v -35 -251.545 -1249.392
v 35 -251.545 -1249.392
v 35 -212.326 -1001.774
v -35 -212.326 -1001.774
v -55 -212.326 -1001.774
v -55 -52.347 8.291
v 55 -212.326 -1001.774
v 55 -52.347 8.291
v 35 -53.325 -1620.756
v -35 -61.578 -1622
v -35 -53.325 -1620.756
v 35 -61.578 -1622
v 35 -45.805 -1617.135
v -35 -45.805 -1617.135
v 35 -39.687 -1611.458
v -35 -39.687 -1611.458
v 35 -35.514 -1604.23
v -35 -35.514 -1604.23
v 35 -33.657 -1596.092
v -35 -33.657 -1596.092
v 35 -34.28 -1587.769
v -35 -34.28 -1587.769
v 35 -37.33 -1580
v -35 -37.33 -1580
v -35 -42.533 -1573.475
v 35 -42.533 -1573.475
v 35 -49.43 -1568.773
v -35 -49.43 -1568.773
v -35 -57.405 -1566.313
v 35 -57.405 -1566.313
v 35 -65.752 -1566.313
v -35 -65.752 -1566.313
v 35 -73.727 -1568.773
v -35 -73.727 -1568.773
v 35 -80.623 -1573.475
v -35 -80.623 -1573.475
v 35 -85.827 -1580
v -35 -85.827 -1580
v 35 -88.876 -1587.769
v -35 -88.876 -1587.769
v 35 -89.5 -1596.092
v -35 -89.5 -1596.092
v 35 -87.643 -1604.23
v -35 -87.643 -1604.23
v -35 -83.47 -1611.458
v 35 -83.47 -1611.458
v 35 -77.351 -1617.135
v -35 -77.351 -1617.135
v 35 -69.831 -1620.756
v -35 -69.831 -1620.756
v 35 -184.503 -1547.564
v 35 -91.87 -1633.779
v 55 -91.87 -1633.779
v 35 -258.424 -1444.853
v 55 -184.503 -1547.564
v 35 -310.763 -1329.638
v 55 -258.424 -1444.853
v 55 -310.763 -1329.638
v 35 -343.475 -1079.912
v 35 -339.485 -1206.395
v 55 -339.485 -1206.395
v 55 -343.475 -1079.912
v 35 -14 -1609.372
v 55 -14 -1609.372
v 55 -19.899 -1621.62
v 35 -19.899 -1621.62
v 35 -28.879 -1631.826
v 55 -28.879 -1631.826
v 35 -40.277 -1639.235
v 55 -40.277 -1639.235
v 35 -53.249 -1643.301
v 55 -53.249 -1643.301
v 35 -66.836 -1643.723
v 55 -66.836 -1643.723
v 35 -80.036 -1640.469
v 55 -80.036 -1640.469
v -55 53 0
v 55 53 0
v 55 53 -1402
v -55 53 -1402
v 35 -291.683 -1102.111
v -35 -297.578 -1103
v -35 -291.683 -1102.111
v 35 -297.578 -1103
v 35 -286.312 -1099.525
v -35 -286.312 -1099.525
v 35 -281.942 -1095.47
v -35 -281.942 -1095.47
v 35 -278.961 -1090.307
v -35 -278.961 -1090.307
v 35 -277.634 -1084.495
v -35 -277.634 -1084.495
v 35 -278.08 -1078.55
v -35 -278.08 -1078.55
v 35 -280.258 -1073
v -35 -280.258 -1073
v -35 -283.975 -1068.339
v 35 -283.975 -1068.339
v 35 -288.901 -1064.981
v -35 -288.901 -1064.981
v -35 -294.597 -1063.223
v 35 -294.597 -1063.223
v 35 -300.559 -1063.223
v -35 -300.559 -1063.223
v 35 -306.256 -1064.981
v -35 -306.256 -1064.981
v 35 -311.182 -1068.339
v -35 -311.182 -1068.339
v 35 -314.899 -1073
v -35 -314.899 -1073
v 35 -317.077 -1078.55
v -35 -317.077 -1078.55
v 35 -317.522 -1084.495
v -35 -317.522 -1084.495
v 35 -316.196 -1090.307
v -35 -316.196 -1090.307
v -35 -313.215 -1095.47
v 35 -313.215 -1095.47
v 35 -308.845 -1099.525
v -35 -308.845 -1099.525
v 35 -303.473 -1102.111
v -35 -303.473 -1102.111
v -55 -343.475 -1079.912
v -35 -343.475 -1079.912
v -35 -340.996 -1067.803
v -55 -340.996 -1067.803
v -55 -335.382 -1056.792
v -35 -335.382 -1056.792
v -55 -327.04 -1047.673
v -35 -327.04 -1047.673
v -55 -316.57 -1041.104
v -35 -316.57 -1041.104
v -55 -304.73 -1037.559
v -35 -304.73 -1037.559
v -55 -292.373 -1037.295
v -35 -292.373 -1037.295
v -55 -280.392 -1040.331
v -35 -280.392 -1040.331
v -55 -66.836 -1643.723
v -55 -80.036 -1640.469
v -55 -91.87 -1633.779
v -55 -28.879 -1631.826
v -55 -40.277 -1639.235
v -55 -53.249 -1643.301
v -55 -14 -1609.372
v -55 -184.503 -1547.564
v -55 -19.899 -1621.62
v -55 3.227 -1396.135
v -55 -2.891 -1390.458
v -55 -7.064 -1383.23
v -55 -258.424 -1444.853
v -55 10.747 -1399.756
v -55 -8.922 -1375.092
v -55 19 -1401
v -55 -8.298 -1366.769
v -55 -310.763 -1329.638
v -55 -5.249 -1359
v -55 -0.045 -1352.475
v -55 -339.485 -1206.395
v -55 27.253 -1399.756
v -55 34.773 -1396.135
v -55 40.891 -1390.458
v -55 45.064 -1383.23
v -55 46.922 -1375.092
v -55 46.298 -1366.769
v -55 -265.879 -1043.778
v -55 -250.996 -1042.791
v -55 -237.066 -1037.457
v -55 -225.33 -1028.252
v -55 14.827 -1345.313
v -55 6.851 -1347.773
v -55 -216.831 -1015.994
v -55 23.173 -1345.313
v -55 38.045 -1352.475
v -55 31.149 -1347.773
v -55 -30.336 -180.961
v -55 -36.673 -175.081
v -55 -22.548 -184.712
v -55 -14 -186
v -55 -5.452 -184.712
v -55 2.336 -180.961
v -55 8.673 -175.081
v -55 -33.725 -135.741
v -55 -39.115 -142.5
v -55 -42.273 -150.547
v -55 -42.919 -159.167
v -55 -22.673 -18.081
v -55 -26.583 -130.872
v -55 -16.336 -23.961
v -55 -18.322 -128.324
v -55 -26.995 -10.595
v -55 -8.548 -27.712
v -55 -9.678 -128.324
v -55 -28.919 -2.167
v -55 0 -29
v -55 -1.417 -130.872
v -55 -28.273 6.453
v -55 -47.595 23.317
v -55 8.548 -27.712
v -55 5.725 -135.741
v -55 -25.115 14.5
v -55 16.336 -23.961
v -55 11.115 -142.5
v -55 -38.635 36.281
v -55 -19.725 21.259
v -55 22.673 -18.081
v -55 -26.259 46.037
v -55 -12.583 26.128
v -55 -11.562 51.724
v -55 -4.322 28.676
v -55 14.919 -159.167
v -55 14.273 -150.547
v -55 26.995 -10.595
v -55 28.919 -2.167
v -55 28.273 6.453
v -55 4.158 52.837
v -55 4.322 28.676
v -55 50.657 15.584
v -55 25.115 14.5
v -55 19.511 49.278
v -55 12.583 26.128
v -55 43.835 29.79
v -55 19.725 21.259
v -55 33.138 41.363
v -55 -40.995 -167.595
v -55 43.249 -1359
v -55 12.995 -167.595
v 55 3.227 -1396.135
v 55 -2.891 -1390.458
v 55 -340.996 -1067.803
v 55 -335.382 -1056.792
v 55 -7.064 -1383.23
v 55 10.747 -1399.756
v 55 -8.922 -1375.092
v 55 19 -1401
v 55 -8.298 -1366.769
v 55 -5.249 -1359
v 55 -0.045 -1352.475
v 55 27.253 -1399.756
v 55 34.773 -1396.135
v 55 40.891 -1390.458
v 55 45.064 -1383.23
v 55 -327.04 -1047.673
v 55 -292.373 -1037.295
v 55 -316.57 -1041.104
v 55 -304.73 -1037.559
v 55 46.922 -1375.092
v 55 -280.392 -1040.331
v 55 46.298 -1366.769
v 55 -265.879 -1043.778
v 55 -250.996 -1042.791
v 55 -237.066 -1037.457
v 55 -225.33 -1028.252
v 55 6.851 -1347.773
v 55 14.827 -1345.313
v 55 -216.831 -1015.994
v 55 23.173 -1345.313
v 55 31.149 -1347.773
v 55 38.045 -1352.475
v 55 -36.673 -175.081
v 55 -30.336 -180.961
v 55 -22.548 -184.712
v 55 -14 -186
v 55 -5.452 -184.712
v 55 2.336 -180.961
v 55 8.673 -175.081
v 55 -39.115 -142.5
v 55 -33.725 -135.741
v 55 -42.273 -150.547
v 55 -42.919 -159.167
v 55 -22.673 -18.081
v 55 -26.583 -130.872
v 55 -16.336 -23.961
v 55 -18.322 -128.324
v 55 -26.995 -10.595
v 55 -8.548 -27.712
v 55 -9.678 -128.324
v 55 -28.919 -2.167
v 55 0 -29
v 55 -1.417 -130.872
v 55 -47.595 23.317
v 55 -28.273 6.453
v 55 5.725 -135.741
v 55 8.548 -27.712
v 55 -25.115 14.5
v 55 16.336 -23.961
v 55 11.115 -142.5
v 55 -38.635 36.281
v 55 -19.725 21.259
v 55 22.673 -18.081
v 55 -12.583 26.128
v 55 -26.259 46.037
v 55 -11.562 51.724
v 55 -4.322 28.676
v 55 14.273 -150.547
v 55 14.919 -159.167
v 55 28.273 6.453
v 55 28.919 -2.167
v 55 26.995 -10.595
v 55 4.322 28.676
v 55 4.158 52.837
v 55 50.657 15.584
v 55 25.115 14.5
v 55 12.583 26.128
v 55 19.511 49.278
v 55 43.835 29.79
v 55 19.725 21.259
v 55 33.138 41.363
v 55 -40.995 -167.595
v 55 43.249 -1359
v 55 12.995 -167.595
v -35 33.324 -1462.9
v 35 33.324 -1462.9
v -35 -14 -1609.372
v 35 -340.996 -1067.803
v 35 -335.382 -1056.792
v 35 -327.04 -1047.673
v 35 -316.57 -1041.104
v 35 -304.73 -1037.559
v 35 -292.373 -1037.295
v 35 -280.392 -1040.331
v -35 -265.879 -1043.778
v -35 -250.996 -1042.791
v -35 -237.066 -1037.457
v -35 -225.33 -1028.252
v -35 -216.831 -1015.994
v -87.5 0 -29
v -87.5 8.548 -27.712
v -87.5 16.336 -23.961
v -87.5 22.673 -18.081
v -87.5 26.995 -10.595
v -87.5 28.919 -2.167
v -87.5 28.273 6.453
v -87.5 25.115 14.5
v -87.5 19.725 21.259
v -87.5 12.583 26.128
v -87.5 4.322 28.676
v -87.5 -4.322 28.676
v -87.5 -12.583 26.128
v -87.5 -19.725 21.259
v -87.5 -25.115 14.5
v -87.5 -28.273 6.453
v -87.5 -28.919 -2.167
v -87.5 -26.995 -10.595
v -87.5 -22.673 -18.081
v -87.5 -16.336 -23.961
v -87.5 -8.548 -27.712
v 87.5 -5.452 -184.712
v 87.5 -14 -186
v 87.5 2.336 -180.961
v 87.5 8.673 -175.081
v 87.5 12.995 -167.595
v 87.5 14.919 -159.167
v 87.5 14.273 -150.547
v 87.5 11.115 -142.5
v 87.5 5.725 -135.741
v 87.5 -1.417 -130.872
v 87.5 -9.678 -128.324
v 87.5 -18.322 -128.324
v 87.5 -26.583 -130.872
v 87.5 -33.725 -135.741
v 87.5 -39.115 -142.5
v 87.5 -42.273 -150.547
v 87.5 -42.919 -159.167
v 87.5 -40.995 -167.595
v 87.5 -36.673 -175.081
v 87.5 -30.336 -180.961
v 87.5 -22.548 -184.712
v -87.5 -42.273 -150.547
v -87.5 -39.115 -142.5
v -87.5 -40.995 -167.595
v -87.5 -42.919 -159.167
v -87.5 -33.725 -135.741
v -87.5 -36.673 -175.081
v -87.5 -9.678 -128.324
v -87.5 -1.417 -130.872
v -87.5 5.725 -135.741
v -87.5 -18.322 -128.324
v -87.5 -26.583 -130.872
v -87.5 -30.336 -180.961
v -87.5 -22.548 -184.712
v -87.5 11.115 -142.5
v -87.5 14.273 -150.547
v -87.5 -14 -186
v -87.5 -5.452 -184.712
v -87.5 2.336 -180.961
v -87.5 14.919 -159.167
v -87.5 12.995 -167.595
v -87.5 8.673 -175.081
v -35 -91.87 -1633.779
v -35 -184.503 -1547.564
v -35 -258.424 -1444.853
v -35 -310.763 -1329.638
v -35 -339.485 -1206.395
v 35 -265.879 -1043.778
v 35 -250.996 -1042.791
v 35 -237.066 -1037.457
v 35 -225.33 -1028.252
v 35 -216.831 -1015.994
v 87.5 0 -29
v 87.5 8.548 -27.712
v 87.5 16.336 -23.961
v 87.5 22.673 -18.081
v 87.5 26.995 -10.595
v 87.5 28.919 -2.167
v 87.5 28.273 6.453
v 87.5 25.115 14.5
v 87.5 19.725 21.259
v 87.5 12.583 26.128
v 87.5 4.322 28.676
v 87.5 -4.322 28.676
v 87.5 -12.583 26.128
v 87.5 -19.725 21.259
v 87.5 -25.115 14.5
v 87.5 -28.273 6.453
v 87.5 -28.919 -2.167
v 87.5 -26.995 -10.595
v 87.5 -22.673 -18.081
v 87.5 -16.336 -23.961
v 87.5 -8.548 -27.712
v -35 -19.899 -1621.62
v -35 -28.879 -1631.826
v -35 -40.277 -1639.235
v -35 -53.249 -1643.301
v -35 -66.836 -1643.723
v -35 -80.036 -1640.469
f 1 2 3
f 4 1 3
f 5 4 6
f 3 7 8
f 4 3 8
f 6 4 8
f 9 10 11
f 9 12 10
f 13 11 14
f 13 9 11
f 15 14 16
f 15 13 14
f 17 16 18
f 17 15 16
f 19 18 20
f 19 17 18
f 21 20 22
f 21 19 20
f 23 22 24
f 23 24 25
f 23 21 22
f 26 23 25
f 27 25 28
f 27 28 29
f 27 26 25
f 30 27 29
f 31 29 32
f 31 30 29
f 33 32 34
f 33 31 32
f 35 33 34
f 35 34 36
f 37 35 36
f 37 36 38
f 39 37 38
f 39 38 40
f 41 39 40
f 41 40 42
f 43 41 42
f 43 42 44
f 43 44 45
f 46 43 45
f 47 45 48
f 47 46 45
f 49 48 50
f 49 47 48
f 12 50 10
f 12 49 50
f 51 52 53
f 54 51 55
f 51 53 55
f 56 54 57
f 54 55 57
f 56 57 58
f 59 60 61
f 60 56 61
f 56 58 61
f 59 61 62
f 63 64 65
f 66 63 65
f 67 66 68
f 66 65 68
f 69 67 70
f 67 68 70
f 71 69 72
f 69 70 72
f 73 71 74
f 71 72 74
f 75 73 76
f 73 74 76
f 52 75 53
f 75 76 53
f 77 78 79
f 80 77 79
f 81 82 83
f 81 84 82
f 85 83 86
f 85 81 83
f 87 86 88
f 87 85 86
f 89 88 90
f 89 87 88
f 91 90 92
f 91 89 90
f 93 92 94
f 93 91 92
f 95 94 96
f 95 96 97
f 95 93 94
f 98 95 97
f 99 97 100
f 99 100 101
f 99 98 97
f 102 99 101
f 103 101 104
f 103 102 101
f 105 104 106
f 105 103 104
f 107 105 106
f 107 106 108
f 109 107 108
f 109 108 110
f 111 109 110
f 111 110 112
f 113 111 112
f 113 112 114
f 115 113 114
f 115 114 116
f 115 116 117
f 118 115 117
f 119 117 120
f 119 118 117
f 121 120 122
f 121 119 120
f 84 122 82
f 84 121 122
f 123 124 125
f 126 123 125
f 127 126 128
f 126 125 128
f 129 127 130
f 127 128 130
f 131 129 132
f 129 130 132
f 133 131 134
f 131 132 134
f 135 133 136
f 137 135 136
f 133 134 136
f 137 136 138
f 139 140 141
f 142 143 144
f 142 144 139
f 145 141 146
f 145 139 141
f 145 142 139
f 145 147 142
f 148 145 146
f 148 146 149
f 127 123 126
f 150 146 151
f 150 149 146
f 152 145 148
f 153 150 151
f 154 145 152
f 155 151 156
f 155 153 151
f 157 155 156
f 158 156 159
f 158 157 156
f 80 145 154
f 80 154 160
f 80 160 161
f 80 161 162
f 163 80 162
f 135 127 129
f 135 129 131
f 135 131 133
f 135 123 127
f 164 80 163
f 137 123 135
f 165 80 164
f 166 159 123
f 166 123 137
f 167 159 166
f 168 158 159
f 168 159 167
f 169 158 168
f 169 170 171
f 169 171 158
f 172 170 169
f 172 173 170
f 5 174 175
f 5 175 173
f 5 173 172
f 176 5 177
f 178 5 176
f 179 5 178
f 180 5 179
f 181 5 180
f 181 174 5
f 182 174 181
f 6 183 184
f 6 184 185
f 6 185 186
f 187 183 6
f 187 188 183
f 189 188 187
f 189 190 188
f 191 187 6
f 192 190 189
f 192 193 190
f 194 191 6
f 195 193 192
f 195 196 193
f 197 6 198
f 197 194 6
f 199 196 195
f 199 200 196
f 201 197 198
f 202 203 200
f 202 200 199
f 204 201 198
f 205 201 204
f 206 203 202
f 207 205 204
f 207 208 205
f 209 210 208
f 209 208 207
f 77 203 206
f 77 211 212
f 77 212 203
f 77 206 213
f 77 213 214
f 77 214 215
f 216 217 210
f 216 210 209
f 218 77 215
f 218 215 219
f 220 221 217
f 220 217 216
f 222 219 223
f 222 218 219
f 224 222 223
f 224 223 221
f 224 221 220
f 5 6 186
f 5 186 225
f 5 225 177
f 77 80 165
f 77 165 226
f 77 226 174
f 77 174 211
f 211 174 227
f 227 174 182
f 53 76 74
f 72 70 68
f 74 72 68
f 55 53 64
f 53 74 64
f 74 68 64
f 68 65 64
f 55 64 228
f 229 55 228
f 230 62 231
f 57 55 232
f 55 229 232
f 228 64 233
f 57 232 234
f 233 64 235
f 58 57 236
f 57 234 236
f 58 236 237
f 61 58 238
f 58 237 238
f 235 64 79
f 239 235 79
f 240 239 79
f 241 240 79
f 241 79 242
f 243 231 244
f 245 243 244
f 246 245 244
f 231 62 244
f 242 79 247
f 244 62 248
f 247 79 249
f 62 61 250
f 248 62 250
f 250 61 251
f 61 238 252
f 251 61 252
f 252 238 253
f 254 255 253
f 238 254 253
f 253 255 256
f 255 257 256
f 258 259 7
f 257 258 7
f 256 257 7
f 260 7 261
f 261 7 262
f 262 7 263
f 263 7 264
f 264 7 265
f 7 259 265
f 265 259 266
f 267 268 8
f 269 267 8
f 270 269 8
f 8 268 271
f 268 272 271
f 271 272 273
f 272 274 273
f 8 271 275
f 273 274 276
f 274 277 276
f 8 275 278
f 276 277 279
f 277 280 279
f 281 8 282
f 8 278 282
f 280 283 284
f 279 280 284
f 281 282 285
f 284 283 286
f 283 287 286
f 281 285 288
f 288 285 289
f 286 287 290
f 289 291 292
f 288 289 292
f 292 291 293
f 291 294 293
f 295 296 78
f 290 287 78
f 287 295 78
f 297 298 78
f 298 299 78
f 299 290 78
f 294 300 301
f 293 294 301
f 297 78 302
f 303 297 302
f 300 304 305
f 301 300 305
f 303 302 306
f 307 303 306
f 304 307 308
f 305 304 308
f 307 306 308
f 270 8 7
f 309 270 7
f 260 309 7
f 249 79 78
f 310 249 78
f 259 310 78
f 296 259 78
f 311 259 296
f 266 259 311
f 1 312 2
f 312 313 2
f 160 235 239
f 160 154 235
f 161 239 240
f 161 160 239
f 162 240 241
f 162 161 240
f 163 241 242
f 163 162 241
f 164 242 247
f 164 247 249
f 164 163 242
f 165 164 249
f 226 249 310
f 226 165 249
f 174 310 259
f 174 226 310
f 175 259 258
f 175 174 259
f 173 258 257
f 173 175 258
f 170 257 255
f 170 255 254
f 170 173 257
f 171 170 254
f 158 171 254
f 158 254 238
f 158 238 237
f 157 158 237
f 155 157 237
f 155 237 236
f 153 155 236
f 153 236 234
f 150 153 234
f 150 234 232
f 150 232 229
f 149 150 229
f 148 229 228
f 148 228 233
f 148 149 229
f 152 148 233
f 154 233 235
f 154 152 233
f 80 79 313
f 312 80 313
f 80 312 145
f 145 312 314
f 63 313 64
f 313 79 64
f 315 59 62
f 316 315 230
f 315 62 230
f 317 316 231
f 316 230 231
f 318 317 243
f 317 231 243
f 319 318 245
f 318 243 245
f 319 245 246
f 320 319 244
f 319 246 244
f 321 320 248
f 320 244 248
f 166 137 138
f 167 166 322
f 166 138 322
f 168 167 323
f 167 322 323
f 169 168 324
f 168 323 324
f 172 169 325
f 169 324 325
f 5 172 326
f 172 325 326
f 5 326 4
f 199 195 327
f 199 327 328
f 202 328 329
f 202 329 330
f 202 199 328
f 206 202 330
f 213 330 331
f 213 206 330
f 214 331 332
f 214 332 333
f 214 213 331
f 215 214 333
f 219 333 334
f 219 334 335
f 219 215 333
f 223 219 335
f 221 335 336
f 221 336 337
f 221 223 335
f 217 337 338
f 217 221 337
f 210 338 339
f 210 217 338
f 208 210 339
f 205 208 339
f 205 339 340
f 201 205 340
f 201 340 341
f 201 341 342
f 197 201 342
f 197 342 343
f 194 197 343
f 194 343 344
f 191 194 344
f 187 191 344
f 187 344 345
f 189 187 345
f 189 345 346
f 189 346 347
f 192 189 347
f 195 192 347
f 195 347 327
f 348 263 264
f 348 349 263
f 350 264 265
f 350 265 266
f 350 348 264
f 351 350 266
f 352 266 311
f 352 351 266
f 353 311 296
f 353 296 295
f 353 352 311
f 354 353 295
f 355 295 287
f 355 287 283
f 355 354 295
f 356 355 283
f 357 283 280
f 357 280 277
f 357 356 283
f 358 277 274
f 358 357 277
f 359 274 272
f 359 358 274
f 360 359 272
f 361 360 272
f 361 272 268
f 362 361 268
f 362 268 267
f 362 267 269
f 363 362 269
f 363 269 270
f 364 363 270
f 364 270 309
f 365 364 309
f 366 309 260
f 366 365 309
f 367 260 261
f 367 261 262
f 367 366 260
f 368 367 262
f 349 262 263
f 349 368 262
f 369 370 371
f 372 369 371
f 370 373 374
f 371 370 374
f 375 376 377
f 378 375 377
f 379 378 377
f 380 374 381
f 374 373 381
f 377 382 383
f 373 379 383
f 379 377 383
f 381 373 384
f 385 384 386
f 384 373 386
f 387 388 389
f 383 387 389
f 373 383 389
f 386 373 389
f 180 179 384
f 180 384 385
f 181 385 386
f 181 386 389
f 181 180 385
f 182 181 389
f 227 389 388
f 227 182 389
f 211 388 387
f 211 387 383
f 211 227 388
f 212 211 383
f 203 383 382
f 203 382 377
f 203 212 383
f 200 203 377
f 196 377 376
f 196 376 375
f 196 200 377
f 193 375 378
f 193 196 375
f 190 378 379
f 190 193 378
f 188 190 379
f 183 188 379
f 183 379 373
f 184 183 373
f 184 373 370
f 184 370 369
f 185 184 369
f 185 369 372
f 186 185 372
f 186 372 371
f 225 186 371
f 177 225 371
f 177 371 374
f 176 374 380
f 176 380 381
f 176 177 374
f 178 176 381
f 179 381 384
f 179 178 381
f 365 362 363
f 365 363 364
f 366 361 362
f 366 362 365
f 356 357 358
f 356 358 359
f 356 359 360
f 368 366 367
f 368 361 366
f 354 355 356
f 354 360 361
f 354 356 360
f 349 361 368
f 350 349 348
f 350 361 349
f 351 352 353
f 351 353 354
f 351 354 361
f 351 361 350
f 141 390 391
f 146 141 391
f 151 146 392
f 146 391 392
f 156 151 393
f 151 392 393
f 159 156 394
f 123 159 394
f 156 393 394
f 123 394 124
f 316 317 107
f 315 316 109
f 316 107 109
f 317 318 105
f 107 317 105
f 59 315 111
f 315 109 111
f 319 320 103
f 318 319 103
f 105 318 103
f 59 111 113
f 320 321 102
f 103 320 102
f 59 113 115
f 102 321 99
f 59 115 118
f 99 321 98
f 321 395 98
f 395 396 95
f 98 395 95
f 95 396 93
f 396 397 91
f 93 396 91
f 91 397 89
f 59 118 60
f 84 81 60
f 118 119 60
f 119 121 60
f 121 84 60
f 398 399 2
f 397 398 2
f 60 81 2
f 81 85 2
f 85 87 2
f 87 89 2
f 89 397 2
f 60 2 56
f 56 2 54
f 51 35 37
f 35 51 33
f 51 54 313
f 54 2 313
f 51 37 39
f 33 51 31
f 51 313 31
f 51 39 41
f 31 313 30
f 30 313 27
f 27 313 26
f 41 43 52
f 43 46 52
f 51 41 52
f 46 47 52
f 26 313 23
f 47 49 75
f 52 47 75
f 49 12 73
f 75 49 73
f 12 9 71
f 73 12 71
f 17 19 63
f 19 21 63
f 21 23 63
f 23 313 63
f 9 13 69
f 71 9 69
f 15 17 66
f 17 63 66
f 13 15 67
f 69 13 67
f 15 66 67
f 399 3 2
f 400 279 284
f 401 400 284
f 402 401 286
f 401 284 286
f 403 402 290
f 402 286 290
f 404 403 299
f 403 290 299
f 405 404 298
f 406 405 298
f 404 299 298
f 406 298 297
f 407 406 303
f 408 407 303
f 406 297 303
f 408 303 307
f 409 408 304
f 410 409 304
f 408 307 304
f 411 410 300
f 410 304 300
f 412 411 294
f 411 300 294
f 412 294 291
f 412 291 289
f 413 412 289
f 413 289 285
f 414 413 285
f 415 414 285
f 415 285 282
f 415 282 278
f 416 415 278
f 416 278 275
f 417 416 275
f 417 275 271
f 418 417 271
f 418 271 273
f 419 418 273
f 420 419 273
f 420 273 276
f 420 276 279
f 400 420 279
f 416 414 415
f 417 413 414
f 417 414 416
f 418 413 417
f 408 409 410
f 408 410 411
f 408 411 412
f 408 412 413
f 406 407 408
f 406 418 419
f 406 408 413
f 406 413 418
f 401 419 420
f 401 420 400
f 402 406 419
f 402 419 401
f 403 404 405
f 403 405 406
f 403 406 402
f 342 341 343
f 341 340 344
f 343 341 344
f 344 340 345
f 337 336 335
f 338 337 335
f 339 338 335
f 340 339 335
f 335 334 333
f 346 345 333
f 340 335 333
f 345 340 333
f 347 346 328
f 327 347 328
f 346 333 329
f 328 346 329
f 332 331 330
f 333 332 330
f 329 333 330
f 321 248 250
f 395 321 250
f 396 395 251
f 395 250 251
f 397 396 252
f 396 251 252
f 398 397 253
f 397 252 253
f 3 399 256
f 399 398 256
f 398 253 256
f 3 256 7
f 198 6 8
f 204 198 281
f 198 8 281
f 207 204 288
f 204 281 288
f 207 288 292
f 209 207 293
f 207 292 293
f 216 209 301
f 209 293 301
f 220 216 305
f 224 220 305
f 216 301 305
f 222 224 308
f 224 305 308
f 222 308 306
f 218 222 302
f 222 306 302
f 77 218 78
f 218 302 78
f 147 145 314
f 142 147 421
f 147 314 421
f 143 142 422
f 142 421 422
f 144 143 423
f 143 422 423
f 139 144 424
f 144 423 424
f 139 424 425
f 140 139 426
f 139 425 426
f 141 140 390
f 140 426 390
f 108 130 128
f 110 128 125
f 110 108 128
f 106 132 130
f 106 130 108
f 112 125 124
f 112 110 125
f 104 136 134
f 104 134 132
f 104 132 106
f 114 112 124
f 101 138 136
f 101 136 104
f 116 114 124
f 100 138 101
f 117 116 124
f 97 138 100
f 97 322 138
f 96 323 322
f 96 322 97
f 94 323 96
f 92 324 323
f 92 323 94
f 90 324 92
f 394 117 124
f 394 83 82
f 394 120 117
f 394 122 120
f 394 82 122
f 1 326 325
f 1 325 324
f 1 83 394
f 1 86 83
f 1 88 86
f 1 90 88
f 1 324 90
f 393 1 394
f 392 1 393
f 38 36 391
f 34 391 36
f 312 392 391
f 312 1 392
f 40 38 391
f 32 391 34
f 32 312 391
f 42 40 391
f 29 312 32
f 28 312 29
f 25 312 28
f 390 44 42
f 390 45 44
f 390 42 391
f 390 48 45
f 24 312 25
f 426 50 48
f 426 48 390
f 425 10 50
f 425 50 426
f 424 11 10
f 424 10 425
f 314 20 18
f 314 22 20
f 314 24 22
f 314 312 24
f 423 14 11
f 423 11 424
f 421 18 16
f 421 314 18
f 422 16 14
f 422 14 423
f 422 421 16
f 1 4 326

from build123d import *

# Parameters (mm, degrees)
SKETCH1_R           = 28
BOSS_EXTRUDE1_DEPTH = 55
CUT_EXTRUDE1_DEPTH  = 35
SKETCH3_R           = 28
SKETCH3_R_2         = 20
BOSS_EXTRUDE2_DEPTH = 35
SKETCH4_R           = 29
BOSS_EXTRUDE3_DEPTH = 87.5


with BuildPart() as part:
    # Sketch1 → Boss-Extrude1 (new, symmetric)
    with BuildSketch(Plane(origin=(0, 0, 0), x_dir=(0, 0, -1), z_dir=(1, 0, 0))):
        with BuildLine():
            ThreePointArc((1633.779443993, -91.870179926), (1388.538518192, -287.439228591), (1079.911873115, -343.474560585))
            ThreePointArc((1079.911873115, -343.474560585), (1044.034822803, -322.026545424), (1040.331298925, -280.391656157))
            ThreePointArc((1040.331298925, -280.391656157), (1037.457004109, -237.066241511), (1001.77399927, -212.326065873))
            Line((1001.77399927, -212.326065873), (-8.291026647, -52.347482052))
            ThreePointArc((-8.291026647, -52.347482052), (-52.836618688, 4.158332074), (0, 53))
            Line((0, 53), (1402, 53))
            Line((1402, 53), (1609.372117166, -14))
            ThreePointArc((1609.372117166, -14), (1641.711266017, -46.623901593), (1633.779443993, -91.870179926))
        make_face()
        with Locations((1373, 19)):
            Circle(SKETCH1_R, mode=Mode.SUBTRACT)
    extrude(amount=BOSS_EXTRUDE1_DEPTH, both=True)

    # Sketch2 → Cut-Extrude1 (cut, symmetric)
    with BuildSketch(Plane(origin=(0, 0, 0), x_dir=(0, 0, -1), z_dir=(1, 0, 0))):
        with BuildLine():
            Line((1462.900269506, 33.323690028), (1249.391694757, -251.544855987))
            Line((1249.391694757, -251.544855987), (1001.77399927, -212.326065873))
            ThreePointArc((1001.77399927, -212.326065873), (1037.457004109, -237.066241511), (1040.331298925, -280.391656157))
            ThreePointArc((1040.331298925, -280.391656157), (1044.034822803, -322.026545424), (1079.911873115, -343.474560585))
            ThreePointArc((1079.911873115, -343.474560585), (1388.538518192, -287.439228591), (1633.779443993, -91.870179926))
            ThreePointArc((1633.779443993, -91.870179926), (1641.711266017, -46.623901593), (1609.372117166, -14))
            Line((1609.372117166, -14), (1462.900269506, 33.323690028))
        make_face()
    extrude(amount=CUT_EXTRUDE1_DEPTH, both=True, mode=Mode.SUBTRACT)

    # Sketch3 → Boss-Extrude2 (add, symmetric)
    with BuildSketch(Plane(origin=(0, 0, 0), x_dir=(0, 0, -1), z_dir=(1, 0, 0))):
        with Locations((1594, -61.578335551)):
            Circle(SKETCH3_R)
        with Locations((1083, -297.578335551)):
            Circle(SKETCH3_R_2)
    extrude(amount=BOSS_EXTRUDE2_DEPTH, both=True)

    # Sketch4 → Boss-Extrude3 (add, symmetric)
    with BuildSketch(Plane(origin=(0, 0, 0), x_dir=(0, 0, -1), z_dir=(1, 0, 0))):
        Circle(SKETCH4_R)
        with Locations((157, -14)):
            Circle(SKETCH4_R)
    extrude(amount=BOSS_EXTRUDE3_DEPTH, both=True)


solid = part.part
